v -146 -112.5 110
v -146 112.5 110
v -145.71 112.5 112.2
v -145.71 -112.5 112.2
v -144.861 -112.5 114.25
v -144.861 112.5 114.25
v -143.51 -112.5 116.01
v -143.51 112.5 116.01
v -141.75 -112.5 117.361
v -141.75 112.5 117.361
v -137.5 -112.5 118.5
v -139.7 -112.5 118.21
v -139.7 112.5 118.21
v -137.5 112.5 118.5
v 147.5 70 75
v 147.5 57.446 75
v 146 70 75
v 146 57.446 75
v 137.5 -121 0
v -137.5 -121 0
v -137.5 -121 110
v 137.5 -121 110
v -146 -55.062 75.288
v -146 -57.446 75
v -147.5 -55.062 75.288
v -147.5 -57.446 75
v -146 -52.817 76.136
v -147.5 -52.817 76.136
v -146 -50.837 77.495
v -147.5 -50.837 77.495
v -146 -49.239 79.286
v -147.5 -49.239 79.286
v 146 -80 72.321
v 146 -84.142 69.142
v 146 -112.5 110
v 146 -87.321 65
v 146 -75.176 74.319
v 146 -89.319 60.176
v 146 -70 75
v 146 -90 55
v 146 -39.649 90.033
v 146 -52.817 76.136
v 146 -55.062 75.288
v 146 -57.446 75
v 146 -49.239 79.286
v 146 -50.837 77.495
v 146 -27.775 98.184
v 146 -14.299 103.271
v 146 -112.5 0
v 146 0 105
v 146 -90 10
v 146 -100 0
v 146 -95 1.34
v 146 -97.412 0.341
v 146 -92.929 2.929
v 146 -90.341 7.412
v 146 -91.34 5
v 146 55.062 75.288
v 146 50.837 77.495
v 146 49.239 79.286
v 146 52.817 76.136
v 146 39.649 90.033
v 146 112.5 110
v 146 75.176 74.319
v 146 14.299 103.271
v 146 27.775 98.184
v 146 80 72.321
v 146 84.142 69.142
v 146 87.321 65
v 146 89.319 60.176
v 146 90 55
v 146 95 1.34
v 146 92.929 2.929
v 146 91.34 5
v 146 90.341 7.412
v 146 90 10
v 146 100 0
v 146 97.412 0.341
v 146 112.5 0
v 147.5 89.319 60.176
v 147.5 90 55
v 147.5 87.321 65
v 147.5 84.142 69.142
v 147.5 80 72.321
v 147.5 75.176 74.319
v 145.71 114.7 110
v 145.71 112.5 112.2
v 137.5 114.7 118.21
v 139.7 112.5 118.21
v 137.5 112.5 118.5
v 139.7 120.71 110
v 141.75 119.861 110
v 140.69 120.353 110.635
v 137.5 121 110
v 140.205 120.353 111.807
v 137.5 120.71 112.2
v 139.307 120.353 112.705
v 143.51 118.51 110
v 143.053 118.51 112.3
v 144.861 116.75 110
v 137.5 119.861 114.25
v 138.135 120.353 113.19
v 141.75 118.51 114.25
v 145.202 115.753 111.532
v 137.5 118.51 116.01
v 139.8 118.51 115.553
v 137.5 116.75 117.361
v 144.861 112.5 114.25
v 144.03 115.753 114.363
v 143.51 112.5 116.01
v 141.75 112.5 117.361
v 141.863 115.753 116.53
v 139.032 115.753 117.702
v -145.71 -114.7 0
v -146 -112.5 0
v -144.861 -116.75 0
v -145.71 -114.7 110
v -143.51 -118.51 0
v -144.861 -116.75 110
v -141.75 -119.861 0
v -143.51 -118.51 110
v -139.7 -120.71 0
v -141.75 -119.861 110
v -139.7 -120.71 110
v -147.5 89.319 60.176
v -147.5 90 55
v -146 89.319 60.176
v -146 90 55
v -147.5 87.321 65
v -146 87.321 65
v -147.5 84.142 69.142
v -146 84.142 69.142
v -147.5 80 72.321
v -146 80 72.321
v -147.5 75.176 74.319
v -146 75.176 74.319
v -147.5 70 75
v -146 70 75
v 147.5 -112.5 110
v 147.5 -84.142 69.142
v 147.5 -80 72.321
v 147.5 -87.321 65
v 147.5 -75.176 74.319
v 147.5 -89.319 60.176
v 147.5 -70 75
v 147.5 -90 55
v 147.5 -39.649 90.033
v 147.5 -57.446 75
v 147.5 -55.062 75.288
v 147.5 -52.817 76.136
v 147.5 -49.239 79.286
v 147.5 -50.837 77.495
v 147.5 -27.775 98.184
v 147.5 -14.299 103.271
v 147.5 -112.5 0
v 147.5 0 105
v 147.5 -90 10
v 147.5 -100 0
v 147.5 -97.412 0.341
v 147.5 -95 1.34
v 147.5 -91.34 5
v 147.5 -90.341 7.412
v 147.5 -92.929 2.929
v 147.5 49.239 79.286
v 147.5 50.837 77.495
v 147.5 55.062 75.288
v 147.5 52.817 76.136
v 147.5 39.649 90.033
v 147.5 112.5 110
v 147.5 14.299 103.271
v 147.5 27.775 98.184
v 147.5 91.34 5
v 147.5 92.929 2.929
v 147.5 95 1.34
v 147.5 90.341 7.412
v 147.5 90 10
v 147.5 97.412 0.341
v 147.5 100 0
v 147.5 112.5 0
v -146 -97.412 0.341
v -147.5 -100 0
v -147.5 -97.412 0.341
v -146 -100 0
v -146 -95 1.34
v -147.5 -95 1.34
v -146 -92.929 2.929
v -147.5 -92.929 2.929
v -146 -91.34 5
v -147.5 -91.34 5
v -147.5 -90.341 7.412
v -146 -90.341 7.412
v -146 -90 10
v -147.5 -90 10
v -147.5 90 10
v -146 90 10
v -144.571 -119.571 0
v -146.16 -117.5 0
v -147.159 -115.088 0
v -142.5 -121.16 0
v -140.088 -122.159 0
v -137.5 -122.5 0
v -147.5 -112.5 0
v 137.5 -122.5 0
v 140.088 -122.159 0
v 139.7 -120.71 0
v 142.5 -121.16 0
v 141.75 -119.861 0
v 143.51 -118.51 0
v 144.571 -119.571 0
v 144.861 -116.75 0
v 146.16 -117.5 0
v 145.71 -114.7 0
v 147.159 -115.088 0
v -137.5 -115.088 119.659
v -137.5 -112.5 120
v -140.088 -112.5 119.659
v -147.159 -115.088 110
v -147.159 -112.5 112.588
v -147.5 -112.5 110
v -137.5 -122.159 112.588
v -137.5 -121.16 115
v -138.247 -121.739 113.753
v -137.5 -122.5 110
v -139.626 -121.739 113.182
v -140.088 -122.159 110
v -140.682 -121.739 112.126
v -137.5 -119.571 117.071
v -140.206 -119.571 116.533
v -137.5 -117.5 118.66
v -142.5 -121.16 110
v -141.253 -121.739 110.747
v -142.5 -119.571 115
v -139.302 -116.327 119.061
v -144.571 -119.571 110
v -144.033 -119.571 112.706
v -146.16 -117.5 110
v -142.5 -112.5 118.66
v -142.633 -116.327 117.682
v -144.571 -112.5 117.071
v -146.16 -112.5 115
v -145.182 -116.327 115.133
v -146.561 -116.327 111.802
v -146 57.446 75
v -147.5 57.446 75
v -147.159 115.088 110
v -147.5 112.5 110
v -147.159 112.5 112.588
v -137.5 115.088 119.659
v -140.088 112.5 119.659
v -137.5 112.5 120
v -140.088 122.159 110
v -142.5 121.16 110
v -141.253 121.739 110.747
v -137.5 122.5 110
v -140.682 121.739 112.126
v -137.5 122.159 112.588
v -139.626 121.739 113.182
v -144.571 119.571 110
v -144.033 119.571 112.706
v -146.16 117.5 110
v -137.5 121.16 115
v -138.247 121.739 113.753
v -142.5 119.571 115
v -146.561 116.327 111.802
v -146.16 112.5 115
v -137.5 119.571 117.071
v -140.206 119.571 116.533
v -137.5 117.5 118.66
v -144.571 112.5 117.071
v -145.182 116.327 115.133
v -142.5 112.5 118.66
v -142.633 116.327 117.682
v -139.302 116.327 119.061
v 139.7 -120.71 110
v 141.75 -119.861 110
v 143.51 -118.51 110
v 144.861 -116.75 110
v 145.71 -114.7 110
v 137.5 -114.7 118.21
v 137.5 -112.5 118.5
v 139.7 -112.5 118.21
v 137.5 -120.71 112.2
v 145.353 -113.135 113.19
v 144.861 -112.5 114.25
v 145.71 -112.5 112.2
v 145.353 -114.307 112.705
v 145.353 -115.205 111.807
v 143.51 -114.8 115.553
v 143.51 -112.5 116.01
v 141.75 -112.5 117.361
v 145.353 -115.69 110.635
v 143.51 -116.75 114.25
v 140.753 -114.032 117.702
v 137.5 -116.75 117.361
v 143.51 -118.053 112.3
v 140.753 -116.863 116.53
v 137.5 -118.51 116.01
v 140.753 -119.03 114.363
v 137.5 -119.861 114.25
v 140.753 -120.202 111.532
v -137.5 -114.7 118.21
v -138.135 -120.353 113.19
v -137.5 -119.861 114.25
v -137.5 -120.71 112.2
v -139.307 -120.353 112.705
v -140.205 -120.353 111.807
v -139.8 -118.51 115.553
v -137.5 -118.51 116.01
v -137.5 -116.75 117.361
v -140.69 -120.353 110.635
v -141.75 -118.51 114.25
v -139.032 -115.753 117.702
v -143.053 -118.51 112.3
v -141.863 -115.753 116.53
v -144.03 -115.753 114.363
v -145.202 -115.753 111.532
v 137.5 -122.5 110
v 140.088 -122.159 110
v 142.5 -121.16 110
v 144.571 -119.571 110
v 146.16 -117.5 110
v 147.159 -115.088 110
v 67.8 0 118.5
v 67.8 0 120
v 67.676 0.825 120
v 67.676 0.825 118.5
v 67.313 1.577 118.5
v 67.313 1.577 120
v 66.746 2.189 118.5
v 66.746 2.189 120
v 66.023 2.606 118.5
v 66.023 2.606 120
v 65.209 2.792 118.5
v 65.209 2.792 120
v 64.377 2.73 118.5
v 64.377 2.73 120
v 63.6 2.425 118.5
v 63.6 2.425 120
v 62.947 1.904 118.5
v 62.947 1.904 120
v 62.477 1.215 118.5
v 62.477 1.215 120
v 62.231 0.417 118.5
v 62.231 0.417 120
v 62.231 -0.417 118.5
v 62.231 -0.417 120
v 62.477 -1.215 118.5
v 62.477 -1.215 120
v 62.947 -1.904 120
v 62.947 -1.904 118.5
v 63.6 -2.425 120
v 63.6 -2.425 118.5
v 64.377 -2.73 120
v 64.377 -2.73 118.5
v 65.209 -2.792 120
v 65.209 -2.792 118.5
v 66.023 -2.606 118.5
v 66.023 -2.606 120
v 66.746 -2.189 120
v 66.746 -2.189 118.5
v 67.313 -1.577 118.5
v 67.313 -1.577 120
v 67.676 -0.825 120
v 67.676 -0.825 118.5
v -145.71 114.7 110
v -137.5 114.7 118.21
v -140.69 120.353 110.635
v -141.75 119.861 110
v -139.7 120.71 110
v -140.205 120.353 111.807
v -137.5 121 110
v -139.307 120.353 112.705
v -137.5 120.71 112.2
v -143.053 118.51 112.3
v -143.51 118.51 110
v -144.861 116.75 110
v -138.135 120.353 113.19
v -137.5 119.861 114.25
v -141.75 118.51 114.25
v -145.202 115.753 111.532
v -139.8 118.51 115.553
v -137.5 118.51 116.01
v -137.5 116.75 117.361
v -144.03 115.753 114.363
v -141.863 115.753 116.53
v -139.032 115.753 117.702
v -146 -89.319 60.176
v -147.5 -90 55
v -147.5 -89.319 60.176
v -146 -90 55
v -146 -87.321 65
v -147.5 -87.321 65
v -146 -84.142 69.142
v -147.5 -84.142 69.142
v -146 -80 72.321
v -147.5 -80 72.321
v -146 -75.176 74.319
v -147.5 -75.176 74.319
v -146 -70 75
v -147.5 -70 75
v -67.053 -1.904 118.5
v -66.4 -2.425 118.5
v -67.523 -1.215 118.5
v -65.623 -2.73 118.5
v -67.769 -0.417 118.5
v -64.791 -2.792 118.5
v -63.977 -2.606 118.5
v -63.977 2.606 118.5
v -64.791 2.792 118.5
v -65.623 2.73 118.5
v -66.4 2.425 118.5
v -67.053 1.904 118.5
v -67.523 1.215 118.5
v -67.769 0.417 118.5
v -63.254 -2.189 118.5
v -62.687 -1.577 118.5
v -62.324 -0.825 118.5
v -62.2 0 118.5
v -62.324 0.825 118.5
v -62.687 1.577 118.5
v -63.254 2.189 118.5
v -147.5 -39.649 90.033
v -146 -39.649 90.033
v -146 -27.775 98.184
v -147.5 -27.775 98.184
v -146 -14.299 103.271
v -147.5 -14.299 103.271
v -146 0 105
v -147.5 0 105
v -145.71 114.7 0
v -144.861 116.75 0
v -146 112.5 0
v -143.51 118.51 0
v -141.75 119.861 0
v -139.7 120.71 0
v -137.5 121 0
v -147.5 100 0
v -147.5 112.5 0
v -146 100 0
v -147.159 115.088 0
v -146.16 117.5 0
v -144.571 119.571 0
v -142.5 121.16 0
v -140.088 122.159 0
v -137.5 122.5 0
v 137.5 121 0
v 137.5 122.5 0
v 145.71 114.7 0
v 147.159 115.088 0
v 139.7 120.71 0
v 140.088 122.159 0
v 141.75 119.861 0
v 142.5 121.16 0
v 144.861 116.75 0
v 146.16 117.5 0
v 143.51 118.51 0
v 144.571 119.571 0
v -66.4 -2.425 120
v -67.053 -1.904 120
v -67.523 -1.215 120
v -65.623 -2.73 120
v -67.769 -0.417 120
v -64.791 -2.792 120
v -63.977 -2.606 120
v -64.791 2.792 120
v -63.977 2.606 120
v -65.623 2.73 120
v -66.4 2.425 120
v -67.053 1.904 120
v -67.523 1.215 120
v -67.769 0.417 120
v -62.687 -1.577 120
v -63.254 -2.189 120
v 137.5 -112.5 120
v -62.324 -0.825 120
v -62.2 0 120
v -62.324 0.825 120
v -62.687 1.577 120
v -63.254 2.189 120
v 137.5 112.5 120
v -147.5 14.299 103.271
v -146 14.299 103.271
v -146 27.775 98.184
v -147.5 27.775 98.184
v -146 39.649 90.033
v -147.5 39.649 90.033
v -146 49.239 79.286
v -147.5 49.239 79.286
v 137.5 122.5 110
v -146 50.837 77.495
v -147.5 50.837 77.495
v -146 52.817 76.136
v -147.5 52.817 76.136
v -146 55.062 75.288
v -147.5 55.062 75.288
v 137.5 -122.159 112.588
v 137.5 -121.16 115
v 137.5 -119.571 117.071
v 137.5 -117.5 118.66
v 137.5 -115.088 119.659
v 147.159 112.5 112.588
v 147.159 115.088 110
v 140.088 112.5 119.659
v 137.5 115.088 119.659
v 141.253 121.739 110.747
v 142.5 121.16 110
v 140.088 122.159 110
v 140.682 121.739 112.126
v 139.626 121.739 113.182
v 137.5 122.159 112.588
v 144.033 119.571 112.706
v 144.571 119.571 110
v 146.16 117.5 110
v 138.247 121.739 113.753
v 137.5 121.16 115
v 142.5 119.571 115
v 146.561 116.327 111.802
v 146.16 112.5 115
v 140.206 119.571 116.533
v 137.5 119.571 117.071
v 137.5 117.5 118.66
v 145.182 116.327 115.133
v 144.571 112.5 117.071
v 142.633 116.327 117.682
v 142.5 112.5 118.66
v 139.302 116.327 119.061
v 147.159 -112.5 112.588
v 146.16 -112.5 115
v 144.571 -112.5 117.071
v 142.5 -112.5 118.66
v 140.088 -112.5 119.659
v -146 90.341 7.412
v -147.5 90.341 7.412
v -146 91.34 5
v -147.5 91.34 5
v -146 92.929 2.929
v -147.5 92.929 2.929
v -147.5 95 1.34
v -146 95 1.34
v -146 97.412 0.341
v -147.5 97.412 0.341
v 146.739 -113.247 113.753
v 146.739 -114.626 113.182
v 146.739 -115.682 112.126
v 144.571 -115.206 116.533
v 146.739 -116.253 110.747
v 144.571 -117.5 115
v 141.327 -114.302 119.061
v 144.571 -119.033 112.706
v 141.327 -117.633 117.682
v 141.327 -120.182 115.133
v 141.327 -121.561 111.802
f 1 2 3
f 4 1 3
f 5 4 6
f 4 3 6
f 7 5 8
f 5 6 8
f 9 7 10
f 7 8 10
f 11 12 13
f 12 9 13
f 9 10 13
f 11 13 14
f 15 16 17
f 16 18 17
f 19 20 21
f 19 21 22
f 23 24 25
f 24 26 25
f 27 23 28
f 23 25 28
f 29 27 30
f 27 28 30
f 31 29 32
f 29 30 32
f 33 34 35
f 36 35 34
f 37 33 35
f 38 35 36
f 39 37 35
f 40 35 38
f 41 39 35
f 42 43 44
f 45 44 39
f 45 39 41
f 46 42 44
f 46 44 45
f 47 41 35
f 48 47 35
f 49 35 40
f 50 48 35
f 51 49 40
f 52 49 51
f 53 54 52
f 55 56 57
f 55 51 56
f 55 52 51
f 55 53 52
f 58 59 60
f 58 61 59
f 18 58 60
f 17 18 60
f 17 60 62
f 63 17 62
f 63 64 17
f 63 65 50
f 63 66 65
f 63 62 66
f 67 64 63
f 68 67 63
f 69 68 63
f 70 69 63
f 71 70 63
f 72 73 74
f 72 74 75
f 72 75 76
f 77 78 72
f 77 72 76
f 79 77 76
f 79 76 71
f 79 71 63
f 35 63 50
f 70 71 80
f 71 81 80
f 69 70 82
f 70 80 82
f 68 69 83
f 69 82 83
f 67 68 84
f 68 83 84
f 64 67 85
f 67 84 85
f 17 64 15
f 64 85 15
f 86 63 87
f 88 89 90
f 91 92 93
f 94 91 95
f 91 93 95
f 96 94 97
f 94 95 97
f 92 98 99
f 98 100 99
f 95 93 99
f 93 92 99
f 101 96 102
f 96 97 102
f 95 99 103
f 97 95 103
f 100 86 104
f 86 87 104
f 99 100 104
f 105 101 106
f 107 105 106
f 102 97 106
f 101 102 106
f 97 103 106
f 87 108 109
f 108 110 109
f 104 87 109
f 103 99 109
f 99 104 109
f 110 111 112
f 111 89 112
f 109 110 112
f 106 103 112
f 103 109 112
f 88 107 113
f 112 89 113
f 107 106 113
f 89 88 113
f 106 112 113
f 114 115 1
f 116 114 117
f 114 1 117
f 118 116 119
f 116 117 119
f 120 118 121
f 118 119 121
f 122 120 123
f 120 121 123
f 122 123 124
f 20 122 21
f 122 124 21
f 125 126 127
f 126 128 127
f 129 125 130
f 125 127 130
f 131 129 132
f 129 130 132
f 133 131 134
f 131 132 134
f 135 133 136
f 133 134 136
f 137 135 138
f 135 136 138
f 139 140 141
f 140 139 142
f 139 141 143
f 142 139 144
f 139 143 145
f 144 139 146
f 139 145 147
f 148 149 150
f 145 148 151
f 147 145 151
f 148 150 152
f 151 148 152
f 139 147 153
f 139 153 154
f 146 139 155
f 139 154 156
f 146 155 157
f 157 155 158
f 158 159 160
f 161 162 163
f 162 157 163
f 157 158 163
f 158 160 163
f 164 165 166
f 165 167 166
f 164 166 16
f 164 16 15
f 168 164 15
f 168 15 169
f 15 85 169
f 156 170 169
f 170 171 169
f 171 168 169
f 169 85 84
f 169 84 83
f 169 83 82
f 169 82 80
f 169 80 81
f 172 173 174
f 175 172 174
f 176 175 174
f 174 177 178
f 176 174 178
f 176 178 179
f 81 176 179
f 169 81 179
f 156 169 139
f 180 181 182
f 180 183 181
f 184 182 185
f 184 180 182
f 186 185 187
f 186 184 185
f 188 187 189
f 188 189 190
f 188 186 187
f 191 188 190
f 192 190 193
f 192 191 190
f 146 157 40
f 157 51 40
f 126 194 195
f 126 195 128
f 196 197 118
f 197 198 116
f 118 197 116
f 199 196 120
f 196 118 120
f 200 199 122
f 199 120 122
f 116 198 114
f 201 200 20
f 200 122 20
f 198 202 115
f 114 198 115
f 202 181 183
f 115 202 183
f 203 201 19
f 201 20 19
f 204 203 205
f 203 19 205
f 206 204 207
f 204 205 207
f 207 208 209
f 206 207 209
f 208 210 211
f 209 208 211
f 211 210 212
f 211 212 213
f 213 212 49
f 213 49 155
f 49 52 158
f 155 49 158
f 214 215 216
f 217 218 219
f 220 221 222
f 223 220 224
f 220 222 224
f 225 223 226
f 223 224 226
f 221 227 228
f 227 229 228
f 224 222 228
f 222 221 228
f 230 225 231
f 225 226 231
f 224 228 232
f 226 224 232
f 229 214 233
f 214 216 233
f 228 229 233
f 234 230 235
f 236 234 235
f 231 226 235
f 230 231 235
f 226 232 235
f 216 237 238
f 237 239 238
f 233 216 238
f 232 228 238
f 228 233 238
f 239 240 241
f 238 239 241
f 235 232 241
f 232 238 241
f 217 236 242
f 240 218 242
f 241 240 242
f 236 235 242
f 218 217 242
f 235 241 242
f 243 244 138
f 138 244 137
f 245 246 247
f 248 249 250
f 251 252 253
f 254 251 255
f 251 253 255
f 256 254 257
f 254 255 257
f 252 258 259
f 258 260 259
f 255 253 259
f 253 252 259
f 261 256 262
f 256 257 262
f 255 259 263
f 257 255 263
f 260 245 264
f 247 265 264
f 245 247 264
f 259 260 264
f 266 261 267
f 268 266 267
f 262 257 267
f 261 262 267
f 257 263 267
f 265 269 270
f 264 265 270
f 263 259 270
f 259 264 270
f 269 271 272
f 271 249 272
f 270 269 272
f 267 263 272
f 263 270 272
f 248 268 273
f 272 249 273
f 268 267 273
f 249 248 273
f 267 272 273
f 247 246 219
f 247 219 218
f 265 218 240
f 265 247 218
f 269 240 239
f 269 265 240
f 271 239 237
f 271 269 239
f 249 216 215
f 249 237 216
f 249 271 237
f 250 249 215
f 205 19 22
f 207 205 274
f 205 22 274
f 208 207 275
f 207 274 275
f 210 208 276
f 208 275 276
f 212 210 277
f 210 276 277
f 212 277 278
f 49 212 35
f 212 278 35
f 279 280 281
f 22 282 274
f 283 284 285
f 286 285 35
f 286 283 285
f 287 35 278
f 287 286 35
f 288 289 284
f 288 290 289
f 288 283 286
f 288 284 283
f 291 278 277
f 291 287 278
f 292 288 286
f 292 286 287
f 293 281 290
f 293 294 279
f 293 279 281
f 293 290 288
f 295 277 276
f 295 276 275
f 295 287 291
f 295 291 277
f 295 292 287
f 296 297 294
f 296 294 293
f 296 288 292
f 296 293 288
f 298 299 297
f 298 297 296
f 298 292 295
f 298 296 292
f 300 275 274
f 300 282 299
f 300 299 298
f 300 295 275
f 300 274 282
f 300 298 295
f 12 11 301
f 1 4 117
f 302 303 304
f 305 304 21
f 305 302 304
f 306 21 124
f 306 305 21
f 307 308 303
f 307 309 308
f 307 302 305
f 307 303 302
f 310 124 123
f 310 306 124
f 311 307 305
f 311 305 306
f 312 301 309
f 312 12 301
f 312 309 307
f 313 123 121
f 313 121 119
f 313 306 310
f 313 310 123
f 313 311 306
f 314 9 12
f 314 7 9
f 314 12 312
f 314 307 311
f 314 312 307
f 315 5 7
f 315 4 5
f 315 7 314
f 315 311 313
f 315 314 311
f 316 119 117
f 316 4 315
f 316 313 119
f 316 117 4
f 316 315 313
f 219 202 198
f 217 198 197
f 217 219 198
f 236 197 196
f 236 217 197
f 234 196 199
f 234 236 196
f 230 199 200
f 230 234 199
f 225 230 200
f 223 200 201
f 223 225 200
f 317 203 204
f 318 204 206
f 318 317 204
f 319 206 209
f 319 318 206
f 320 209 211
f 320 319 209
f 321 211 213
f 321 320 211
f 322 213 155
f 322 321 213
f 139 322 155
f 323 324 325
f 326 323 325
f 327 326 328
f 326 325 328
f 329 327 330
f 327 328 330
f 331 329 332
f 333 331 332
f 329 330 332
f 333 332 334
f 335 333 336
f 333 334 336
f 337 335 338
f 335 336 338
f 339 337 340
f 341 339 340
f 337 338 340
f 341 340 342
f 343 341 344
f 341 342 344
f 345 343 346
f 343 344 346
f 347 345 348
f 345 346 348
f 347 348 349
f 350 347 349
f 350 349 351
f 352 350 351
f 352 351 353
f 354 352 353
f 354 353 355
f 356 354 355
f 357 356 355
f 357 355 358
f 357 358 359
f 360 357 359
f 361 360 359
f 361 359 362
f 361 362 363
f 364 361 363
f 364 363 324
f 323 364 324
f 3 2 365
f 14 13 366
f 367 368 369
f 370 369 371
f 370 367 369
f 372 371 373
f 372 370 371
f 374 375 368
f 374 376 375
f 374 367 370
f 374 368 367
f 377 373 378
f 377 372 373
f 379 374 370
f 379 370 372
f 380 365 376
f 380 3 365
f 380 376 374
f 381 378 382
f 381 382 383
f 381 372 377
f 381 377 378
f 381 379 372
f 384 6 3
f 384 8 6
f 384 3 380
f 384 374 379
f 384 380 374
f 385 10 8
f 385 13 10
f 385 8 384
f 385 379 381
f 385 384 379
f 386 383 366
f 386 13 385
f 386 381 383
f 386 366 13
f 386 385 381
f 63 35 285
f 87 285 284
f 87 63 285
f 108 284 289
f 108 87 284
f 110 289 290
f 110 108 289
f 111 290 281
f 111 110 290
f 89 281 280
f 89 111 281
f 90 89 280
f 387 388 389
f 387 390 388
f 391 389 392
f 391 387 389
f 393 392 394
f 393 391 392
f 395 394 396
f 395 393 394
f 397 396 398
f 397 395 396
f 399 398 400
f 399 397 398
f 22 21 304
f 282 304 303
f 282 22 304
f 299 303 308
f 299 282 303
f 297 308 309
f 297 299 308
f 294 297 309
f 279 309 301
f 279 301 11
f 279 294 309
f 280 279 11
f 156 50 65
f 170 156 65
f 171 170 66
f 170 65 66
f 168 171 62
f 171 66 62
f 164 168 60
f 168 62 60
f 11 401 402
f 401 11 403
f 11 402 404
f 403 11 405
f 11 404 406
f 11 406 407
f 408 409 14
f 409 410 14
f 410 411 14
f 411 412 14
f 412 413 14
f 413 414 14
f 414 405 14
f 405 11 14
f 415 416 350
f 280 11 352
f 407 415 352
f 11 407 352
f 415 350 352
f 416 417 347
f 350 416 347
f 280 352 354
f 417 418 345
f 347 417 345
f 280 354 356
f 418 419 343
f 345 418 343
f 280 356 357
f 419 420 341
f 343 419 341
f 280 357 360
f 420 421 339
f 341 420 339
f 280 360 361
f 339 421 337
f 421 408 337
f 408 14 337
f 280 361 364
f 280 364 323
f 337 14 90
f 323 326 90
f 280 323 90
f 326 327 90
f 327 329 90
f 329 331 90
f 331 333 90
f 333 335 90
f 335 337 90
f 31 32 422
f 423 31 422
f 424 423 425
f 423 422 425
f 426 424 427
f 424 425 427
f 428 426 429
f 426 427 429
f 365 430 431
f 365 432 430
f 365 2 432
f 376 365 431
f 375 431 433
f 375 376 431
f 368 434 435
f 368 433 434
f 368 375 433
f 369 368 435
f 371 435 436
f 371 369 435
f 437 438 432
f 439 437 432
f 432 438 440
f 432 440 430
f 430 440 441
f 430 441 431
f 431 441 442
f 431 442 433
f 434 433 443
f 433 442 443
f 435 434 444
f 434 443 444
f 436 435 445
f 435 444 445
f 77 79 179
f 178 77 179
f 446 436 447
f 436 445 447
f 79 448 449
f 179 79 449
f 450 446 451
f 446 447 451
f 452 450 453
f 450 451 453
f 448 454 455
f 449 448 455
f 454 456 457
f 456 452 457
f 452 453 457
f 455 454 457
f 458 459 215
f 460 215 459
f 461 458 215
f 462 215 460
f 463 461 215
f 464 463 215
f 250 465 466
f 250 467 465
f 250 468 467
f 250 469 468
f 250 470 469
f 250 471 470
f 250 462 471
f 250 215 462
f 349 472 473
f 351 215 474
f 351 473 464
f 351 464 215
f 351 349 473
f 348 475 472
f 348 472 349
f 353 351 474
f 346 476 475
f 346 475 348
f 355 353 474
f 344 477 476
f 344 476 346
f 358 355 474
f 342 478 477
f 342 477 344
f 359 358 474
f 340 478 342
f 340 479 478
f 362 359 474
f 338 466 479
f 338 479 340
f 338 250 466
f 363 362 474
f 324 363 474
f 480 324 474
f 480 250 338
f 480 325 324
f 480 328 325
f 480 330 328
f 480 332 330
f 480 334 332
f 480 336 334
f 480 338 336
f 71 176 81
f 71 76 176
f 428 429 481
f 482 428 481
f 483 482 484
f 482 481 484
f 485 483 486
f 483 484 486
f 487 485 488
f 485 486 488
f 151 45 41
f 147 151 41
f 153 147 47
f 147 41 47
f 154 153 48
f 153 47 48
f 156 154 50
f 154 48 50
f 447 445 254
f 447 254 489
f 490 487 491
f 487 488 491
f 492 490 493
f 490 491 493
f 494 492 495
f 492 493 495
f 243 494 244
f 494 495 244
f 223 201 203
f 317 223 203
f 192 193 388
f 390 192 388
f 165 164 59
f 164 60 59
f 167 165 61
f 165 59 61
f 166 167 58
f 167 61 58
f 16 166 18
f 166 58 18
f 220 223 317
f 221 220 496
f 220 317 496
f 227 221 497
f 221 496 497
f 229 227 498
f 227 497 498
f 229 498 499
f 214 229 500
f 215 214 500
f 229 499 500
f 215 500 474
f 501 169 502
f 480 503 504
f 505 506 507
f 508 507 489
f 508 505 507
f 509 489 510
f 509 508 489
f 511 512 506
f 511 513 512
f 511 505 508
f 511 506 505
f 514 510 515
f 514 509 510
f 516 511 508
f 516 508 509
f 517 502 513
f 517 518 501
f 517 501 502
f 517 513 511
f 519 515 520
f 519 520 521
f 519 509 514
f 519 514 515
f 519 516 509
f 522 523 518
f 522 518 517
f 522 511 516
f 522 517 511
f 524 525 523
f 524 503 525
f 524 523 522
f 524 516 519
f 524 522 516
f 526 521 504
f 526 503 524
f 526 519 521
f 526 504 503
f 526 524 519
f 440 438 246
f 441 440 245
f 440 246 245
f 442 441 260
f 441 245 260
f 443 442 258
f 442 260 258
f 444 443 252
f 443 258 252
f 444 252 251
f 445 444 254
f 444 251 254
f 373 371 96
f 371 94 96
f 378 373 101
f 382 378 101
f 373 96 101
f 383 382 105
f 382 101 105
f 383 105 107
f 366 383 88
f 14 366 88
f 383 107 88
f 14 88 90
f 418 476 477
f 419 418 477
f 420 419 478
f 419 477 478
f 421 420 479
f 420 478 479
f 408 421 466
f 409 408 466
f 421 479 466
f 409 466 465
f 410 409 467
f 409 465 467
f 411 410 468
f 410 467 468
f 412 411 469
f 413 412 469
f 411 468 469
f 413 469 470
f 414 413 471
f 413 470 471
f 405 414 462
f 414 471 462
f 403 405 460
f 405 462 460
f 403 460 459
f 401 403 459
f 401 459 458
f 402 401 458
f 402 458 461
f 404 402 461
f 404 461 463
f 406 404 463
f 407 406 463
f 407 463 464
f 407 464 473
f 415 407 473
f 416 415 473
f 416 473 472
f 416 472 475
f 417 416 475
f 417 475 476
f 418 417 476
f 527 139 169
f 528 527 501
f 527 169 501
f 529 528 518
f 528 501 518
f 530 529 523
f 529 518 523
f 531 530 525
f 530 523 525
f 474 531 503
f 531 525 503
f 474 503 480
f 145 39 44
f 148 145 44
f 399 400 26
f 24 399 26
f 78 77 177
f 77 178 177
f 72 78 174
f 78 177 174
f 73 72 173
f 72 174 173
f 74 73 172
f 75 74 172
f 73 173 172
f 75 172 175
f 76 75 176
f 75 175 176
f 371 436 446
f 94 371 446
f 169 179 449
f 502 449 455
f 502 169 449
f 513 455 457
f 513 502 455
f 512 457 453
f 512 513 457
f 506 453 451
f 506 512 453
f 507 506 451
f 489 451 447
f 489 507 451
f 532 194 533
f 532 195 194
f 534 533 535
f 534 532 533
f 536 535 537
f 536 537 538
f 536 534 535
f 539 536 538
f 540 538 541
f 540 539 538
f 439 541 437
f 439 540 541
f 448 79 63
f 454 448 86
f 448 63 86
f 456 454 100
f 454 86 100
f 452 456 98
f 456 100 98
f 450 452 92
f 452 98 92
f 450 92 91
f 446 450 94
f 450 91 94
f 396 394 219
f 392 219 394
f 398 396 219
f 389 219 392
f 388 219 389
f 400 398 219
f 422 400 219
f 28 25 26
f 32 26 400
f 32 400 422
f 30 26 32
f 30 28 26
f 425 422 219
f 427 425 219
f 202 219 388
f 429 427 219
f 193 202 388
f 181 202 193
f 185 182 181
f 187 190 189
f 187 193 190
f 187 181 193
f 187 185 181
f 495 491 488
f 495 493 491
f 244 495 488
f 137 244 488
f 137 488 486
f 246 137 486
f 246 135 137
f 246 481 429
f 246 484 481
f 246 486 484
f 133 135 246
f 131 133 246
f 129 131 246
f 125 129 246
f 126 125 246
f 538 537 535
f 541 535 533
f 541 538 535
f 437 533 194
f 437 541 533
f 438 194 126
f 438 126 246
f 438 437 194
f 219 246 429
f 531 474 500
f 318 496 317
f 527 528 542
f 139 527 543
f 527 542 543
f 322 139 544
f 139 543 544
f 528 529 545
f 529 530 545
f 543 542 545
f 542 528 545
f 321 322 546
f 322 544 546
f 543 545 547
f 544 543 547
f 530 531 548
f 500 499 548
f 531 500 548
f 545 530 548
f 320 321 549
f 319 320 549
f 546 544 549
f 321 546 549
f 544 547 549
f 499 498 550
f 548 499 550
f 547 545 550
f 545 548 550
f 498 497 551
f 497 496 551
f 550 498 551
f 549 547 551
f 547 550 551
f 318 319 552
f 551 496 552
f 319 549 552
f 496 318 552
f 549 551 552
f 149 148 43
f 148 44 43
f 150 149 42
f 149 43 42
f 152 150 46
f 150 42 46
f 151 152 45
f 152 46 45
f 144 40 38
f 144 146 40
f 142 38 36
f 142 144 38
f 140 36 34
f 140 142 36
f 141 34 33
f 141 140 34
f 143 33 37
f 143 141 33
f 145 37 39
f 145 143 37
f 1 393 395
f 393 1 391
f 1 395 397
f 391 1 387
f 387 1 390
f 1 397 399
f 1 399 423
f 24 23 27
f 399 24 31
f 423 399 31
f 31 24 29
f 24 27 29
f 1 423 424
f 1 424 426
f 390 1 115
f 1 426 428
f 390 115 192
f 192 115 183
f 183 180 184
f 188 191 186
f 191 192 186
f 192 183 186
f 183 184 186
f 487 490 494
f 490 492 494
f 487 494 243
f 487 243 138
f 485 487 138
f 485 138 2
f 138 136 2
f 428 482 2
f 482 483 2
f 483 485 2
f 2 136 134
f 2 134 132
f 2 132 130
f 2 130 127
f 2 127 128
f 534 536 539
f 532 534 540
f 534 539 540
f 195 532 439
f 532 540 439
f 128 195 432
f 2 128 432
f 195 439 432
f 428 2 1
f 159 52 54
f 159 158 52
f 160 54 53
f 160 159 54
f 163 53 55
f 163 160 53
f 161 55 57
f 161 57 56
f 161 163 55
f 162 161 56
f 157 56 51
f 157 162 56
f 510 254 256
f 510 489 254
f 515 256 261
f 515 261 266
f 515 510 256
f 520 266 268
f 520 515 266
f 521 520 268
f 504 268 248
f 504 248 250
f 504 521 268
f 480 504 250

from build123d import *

# Parameters (mm, degrees)
SKETCH_1_W          = 295
SKETCH_1_H          = 245
EXTRUDE_1_DEPTH     = 120
FILLET_1_R          = 10
SHELL_1_T           = -1.5
CUT_EXTRUDE_1_DEPTH = 342.220236797
SKETCH_3_W          = 150
SKETCH_3_H          = 60
CUT_EXTRUDE_2_DEPTH = 342.220236797
FILLET_2_R          = 10
FILLET_3_R          = 20
SKETCH_4_R          = 2.8
CUT_EXTRUDE_3_DEPTH = 10


with BuildPart() as part:
    # 草图1 → 凸台-拉伸1 (new body)
    with BuildSketch(Plane.XY):
        Rectangle(SKETCH_1_W, SKETCH_1_H)
    extrude(amount=EXTRUDE_1_DEPTH)

    # 圆角1
    fillet_1_edges = [part.edges().sort_by_distance(p)[0] for p in [
        (-147.5, 0, 120),
        (0, -122.5, 120),
        (147.5, 0, 120),
        (147.5, -122.5, 60),
        (-147.5, -122.5, 60),
        (-147.5, 122.5, 60),
        (147.5, 122.5, 60),
        (0, 122.5, 120),
    ]]
    fillet(fillet_1_edges, radius=FILLET_1_R)

    # 抽壳1
    shell_1_openings = [part.faces().sort_by_distance(p)[0] for p in [
        (0, 0, 0),
    ]]
    offset(amount=SHELL_1_T, openings=shell_1_openings, kind=Kind.INTERSECTION)

    # 草图2 → 切除-拉伸1 (cut, through all)
    with BuildSketch(Plane.ZY.offset(147.5)):
        with BuildLine():
            ThreePointArc((105, 0), (87.426406871, 42.426406871), (45, 60))
            Line((45, 60), (45, -60))
            ThreePointArc((45, -60), (87.426406871, -42.426406871), (105, 0))
        make_face()
        with BuildLine():
            Line((45, -60), (45, 60))
            ThreePointArc((45, 60), (20.313730334, 54.686269666), (0, 39.686269666))
            Line((0, 39.686269666), (0, -39.686269666))
            ThreePointArc((0, -39.686269666), (20.313730334, -54.686269666), (45, -60))
        make_face()
        with BuildLine():
            Line((0, -39.686269666), (0, 39.686269666))
            ThreePointArc((0, 39.686269666), (-15, 0), (0, -39.686269666))
        make_face()
        with BuildLine():
            Line((45, 60), (0, 60))
            Line((0, 60), (0, 39.686269666))
            ThreePointArc((0, 39.686269666), (20.313730334, 54.686269666), (45, 60))
        make_face()
        with BuildLine():
            Line((0, -39.686269666), (0, -60))
            Line((0, -60), (45, -60))
            ThreePointArc((45, -60), (20.313730334, -54.686269666), (0, -39.686269666))
        make_face()
    extrude(amount=-CUT_EXTRUDE_1_DEPTH, mode=Mode.SUBTRACT)

    # 草图3 → 切除-拉伸2 (cut, through all)
    with BuildSketch(Plane.ZY.offset(147.5)):
        with Locations((0, -60)):
            Rectangle(SKETCH_3_W, SKETCH_3_H)
        with Locations((0, 60)):
            Rectangle(SKETCH_3_W, SKETCH_3_H)
    extrude(amount=-CUT_EXTRUDE_2_DEPTH, mode=Mode.SUBTRACT)

    # 圆角2
    fillet_2_edges = [part.edges().sort_by_distance(p)[0] for p in [
        (146.75, 51.961524227, 75),
        (146.75, -51.961524227, 75),
        (146.75, -90, 0),
        (-146.75, -90, 0),
        (-146.75, -51.961524227, 75),
        (146.75, 90, 0),
        (-146.75, 90, 0),
        (-146.75, 51.961524227, 75),
    ]]
    fillet(fillet_2_edges, radius=FILLET_2_R)

    # 圆角3
    fillet_3_edges = [part.edges().sort_by_distance(p)[0] for p in [
        (146.75, -90, 75),
        (-146.75, -90, 75),
        (-146.75, 90, 75),
        (146.75, 90, 75),
    ]]
    fillet(fillet_3_edges, radius=FILLET_3_R)

    # 草图4 → 切除-拉伸3 (cut)
    with BuildSketch(Plane.XY.offset(120)):
        with Locations((-65, 0)):
            Circle(SKETCH_4_R)
        with Locations((65, 0)):
            Circle(SKETCH_4_R)
    extrude(amount=-CUT_EXTRUDE_3_DEPTH, mode=Mode.SUBTRACT)


solid = part.part
